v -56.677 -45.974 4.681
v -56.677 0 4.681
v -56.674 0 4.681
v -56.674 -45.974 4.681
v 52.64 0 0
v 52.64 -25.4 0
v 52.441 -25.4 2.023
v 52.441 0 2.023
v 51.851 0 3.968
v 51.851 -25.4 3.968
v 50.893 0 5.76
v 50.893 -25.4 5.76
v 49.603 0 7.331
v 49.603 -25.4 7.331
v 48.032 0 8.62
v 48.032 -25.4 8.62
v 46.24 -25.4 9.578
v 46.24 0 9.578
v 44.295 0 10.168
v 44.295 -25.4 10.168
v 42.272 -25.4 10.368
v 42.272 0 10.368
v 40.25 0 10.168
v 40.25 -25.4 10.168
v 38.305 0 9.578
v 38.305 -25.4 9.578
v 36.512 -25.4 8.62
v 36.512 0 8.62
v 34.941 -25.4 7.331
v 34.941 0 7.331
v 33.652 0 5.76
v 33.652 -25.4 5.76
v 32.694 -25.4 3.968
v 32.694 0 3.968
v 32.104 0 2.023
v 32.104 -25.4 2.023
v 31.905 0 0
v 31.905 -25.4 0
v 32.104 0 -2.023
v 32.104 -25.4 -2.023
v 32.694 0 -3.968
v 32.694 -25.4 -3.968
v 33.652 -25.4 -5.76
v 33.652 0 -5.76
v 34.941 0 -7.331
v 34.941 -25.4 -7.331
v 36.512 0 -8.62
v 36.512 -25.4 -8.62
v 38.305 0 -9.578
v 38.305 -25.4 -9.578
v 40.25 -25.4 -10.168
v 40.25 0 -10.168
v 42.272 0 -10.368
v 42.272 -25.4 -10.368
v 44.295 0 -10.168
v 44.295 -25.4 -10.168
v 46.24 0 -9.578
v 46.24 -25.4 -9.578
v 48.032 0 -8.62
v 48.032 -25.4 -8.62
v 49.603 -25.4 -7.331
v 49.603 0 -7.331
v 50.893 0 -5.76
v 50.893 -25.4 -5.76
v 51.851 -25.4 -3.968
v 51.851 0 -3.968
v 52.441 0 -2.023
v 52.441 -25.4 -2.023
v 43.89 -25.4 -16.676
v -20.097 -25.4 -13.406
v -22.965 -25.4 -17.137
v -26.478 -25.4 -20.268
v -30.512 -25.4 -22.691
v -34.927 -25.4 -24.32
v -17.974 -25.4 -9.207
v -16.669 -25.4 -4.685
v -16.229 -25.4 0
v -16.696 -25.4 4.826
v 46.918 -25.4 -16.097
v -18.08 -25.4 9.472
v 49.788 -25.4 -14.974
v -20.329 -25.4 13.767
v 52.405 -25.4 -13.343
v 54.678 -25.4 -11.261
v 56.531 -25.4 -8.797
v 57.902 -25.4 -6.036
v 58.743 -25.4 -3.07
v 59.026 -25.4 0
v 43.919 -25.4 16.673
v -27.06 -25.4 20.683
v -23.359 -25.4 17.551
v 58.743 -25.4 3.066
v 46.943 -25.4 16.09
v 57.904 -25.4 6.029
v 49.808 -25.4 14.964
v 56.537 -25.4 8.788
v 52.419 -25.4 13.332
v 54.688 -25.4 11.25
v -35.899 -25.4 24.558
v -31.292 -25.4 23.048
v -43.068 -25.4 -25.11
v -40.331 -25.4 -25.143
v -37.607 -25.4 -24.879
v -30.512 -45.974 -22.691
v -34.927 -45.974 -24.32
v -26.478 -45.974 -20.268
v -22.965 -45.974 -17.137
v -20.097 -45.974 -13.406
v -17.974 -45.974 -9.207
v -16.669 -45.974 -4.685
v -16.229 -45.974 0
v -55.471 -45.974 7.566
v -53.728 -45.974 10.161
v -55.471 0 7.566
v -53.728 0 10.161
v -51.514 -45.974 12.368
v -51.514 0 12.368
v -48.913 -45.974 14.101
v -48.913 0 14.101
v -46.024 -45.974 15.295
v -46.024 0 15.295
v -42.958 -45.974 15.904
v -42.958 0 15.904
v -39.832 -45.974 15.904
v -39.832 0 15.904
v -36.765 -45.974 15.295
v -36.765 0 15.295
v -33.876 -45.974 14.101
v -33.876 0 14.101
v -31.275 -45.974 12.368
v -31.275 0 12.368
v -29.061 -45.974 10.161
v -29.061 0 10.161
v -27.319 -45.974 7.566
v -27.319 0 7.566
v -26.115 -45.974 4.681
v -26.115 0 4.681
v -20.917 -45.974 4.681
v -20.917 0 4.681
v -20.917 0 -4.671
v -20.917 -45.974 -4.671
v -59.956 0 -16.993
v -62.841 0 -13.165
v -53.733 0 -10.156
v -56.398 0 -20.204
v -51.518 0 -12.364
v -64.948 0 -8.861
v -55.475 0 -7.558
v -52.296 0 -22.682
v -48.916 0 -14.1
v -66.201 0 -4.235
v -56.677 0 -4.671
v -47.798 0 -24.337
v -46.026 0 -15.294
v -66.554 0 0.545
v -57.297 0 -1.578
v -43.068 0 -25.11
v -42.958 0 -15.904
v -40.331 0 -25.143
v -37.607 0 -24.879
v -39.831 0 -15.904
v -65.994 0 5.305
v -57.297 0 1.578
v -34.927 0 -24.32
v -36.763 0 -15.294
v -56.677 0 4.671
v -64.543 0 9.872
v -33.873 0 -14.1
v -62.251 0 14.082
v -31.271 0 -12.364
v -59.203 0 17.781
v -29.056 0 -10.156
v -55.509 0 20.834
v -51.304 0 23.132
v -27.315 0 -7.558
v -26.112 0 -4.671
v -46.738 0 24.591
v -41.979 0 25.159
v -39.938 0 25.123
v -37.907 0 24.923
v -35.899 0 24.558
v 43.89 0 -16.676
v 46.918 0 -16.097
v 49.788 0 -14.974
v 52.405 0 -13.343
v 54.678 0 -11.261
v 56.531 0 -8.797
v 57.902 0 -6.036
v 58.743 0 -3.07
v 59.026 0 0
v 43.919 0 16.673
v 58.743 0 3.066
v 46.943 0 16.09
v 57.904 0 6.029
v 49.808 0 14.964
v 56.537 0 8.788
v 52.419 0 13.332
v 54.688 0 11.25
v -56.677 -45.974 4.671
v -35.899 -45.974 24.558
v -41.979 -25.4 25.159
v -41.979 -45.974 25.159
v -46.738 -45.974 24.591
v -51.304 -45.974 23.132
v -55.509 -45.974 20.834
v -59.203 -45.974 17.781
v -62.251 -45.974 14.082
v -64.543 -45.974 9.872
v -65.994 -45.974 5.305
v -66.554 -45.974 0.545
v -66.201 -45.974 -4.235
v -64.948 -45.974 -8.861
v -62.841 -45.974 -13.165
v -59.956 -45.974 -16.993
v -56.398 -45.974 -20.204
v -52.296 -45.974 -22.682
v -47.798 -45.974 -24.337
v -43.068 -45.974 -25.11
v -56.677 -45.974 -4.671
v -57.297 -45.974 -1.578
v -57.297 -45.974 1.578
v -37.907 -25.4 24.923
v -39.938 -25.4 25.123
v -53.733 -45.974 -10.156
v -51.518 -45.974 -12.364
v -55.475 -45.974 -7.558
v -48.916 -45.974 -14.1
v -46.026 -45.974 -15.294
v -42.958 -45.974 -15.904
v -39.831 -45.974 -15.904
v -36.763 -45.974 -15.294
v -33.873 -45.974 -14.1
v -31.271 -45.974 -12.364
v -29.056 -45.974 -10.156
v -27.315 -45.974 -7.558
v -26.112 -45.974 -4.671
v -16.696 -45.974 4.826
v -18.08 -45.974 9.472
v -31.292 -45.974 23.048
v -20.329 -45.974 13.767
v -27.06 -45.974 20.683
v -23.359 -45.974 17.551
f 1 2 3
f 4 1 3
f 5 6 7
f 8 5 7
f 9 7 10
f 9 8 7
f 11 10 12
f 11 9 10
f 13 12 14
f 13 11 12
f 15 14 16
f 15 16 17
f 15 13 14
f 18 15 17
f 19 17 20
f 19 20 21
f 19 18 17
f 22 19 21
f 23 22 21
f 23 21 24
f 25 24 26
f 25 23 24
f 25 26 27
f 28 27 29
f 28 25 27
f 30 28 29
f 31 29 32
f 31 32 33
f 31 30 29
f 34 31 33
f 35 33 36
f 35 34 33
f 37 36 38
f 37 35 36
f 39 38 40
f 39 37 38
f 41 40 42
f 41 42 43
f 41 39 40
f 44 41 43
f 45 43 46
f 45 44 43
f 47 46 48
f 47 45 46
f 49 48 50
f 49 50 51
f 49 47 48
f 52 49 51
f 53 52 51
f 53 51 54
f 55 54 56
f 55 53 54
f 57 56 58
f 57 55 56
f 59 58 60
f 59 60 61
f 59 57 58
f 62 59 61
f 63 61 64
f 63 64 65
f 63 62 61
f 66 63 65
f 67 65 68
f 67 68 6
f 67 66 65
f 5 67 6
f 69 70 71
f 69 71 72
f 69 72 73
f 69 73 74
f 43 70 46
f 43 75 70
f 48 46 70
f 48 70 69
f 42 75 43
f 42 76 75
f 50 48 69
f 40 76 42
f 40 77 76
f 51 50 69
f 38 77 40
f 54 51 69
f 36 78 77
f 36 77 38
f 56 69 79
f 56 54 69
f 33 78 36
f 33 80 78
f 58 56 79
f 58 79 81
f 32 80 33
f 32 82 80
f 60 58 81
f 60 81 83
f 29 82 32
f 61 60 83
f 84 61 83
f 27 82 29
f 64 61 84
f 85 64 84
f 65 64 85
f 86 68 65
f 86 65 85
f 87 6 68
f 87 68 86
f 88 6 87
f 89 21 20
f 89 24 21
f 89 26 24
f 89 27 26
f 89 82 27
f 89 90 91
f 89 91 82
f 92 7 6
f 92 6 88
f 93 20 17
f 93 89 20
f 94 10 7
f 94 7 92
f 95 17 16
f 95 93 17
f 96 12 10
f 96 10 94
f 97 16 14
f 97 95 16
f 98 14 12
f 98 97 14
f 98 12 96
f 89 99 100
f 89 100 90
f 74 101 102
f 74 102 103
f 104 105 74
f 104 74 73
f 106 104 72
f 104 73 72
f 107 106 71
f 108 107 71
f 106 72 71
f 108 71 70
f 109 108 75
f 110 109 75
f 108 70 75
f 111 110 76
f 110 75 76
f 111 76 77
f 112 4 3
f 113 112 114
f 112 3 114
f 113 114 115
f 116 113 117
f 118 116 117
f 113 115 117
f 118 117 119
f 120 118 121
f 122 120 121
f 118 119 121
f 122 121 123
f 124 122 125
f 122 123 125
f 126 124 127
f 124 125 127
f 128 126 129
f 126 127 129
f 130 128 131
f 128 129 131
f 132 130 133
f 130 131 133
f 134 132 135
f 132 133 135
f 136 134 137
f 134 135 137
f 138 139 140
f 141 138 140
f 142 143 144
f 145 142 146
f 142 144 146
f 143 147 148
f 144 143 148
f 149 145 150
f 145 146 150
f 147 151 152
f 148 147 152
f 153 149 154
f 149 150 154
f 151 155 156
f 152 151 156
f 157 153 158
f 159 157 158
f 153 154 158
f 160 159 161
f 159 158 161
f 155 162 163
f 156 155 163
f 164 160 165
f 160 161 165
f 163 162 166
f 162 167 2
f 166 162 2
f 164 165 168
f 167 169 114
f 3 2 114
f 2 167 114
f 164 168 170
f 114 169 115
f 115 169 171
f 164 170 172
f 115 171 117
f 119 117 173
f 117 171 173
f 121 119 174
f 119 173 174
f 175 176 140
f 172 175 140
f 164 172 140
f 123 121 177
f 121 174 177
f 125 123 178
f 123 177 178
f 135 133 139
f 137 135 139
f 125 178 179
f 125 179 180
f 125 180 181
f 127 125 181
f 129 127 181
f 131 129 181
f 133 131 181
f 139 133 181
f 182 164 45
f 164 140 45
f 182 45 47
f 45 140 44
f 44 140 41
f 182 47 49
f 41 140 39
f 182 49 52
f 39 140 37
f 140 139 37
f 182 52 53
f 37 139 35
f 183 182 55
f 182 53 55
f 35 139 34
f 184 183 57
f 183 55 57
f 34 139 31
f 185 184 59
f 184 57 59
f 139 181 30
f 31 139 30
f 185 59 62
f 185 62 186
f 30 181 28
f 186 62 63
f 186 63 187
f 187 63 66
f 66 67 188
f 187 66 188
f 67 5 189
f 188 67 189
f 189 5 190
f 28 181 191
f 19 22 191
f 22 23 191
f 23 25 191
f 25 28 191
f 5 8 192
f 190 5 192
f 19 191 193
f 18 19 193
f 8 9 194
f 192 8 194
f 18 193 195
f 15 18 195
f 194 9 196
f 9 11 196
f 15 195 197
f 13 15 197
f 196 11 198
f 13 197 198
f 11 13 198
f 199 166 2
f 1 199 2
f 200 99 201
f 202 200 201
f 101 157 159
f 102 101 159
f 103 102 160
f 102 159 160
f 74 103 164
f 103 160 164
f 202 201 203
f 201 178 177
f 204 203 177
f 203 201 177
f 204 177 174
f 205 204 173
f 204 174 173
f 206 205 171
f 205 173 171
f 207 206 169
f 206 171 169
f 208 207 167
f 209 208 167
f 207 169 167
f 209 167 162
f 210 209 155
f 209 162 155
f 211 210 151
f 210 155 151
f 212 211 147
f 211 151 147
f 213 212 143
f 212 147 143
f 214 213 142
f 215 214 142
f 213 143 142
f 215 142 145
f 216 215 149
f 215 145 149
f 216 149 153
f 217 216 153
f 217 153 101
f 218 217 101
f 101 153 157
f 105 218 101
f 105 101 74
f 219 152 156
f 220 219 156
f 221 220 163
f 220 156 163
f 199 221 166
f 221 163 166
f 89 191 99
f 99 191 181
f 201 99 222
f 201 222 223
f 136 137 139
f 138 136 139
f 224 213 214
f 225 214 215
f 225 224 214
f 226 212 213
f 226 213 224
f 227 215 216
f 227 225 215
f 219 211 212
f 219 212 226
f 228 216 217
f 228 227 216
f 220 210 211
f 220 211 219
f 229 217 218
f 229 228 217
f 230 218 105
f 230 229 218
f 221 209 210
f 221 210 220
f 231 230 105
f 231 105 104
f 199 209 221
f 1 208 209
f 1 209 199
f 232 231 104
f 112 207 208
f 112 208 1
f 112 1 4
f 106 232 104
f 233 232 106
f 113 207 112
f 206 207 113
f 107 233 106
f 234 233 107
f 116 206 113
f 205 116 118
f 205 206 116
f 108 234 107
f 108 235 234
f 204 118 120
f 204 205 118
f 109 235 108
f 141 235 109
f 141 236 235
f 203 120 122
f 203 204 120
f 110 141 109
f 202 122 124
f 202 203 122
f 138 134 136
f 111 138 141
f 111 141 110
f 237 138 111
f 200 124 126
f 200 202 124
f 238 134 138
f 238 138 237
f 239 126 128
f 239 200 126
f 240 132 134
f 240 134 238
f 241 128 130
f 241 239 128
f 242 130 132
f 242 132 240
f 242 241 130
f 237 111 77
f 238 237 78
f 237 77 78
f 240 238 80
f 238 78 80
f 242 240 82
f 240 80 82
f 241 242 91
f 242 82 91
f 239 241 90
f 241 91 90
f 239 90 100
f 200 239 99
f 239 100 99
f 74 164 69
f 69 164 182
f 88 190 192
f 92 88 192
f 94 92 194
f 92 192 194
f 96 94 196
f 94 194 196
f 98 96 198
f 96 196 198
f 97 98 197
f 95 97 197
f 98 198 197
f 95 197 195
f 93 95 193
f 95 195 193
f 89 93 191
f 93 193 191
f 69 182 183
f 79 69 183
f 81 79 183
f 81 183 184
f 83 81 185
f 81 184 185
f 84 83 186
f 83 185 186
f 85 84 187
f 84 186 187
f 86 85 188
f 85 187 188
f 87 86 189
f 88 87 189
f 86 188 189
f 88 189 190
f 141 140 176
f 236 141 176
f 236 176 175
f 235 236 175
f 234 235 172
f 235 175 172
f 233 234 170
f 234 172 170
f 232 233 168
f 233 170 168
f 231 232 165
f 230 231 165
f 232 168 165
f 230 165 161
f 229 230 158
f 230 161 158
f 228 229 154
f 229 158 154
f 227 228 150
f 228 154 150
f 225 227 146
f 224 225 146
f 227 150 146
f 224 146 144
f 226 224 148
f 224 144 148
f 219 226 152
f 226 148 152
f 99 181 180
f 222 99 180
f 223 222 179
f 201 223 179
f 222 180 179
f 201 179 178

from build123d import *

# Parameters (mm, degrees)
F0_R     = 10.367684
F1_DEPTH = 25.4
F2_DEPTH = 45.974


with BuildPart() as f1:
    # F0 (on Front) → F1 (new body)
    with BuildSketch(Plane.XZ):
        with BuildLine():
            Line((-35.898636, 24.557869), (-41.97927, 25.158544))
            ThreePointArc((-41.97927, 25.158544), (-66.554008, 0.545011), (-43.068193, -25.109624))
            Line((-43.068193, -25.109624), (-34.926978, -24.320042))
            ThreePointArc((-34.926978, -24.320042), (-21.443966, -15.338432), (-16.229235, 0))
            ThreePointArc((-16.229235, 0), (-21.752764, 15.731928), (-35.898636, 24.557869))
        make_face()
        with BuildLine():
            ThreePointArc((-56.674072, 4.680658), (-41.394573, 15.980353), (-26.115073, 4.680658))
            Line((-26.115073, 4.680658), (-20.916691, 4.680658))
            Line((-20.916691, 4.680658), (-20.916691, -4.671074))
            Line((-20.916691, -4.671074), (-26.112141, -4.671074))
            ThreePointArc((-26.112141, -4.671074), (-41.394573, -15.980353), (-56.677005, -4.671074))
            ThreePointArc((-56.677005, -4.671074), (-57.374925, 0), (-56.677005, 4.671074))
            Line((-56.677005, 4.671074), (-56.677005, 4.680658))
            Line((-56.677005, 4.680658), (-56.674072, 4.680658))
        make_face(mode=Mode.SUBTRACT)
        with BuildLine():
            ThreePointArc((-35.898636, 24.557869), (-38.920654, 25.043441), (-41.97927, 25.158544))
            Line((-41.97927, 25.158544), (-35.898636, 24.557869))
        make_face()
        with BuildLine():
            Line((-34.926978, -24.320042), (-43.068193, -25.109624))
            ThreePointArc((-43.068193, -25.109624), (-38.965291, -25.047811), (-34.926978, -24.320042))
        make_face()
        with BuildLine():
            Line((43.919244, 16.673053), (-35.898636, 24.557869))
            ThreePointArc((-35.898636, 24.557869), (-21.752764, 15.731928), (-16.229235, 0))
            ThreePointArc((-16.229235, 0), (-21.443966, -15.338432), (-34.926978, -24.320042))
            Line((-34.926978, -24.320042), (43.889526, -16.675962))
            ThreePointArc((43.889526, -16.675962), (25.517994, 0.01493), (43.919244, 16.673053))
        make_face()
        with BuildLine():
            ThreePointArc((59.026403, 0), (54.68788, 11.249633), (43.919244, 16.673053))
            ThreePointArc((43.919244, 16.673053), (25.517994, 0.01493), (43.889526, -16.675962))
            ThreePointArc((43.889526, -16.675962), (54.677851, -11.260692), (59.026403, 0))
        make_face()
        with Locations((42.272195, 0)):
            Circle(F0_R, mode=Mode.SUBTRACT)
    extrude(amount=F1_DEPTH)

    # F0 (on Front) → F2 (join)
    with BuildSketch(Plane.XZ):
        with BuildLine():
            Line((-35.898636, 24.557869), (-41.97927, 25.158544))
            ThreePointArc((-41.97927, 25.158544), (-66.554008, 0.545011), (-43.068193, -25.109624))
            Line((-43.068193, -25.109624), (-34.926978, -24.320042))
            ThreePointArc((-34.926978, -24.320042), (-21.443966, -15.338432), (-16.229235, 0))
            ThreePointArc((-16.229235, 0), (-21.752764, 15.731928), (-35.898636, 24.557869))
        make_face()
        with BuildLine():
            ThreePointArc((-56.674072, 4.680658), (-41.394573, 15.980353), (-26.115073, 4.680658))
            Line((-26.115073, 4.680658), (-20.916691, 4.680658))
            Line((-20.916691, 4.680658), (-20.916691, -4.671074))
            Line((-20.916691, -4.671074), (-26.112141, -4.671074))
            ThreePointArc((-26.112141, -4.671074), (-41.394573, -15.980353), (-56.677005, -4.671074))
            ThreePointArc((-56.677005, -4.671074), (-57.374925, 0), (-56.677005, 4.671074))
            Line((-56.677005, 4.671074), (-56.677005, 4.680658))
            Line((-56.677005, 4.680658), (-56.674072, 4.680658))
        make_face(mode=Mode.SUBTRACT)
    extrude(amount=F2_DEPTH)


solid = f1.part
